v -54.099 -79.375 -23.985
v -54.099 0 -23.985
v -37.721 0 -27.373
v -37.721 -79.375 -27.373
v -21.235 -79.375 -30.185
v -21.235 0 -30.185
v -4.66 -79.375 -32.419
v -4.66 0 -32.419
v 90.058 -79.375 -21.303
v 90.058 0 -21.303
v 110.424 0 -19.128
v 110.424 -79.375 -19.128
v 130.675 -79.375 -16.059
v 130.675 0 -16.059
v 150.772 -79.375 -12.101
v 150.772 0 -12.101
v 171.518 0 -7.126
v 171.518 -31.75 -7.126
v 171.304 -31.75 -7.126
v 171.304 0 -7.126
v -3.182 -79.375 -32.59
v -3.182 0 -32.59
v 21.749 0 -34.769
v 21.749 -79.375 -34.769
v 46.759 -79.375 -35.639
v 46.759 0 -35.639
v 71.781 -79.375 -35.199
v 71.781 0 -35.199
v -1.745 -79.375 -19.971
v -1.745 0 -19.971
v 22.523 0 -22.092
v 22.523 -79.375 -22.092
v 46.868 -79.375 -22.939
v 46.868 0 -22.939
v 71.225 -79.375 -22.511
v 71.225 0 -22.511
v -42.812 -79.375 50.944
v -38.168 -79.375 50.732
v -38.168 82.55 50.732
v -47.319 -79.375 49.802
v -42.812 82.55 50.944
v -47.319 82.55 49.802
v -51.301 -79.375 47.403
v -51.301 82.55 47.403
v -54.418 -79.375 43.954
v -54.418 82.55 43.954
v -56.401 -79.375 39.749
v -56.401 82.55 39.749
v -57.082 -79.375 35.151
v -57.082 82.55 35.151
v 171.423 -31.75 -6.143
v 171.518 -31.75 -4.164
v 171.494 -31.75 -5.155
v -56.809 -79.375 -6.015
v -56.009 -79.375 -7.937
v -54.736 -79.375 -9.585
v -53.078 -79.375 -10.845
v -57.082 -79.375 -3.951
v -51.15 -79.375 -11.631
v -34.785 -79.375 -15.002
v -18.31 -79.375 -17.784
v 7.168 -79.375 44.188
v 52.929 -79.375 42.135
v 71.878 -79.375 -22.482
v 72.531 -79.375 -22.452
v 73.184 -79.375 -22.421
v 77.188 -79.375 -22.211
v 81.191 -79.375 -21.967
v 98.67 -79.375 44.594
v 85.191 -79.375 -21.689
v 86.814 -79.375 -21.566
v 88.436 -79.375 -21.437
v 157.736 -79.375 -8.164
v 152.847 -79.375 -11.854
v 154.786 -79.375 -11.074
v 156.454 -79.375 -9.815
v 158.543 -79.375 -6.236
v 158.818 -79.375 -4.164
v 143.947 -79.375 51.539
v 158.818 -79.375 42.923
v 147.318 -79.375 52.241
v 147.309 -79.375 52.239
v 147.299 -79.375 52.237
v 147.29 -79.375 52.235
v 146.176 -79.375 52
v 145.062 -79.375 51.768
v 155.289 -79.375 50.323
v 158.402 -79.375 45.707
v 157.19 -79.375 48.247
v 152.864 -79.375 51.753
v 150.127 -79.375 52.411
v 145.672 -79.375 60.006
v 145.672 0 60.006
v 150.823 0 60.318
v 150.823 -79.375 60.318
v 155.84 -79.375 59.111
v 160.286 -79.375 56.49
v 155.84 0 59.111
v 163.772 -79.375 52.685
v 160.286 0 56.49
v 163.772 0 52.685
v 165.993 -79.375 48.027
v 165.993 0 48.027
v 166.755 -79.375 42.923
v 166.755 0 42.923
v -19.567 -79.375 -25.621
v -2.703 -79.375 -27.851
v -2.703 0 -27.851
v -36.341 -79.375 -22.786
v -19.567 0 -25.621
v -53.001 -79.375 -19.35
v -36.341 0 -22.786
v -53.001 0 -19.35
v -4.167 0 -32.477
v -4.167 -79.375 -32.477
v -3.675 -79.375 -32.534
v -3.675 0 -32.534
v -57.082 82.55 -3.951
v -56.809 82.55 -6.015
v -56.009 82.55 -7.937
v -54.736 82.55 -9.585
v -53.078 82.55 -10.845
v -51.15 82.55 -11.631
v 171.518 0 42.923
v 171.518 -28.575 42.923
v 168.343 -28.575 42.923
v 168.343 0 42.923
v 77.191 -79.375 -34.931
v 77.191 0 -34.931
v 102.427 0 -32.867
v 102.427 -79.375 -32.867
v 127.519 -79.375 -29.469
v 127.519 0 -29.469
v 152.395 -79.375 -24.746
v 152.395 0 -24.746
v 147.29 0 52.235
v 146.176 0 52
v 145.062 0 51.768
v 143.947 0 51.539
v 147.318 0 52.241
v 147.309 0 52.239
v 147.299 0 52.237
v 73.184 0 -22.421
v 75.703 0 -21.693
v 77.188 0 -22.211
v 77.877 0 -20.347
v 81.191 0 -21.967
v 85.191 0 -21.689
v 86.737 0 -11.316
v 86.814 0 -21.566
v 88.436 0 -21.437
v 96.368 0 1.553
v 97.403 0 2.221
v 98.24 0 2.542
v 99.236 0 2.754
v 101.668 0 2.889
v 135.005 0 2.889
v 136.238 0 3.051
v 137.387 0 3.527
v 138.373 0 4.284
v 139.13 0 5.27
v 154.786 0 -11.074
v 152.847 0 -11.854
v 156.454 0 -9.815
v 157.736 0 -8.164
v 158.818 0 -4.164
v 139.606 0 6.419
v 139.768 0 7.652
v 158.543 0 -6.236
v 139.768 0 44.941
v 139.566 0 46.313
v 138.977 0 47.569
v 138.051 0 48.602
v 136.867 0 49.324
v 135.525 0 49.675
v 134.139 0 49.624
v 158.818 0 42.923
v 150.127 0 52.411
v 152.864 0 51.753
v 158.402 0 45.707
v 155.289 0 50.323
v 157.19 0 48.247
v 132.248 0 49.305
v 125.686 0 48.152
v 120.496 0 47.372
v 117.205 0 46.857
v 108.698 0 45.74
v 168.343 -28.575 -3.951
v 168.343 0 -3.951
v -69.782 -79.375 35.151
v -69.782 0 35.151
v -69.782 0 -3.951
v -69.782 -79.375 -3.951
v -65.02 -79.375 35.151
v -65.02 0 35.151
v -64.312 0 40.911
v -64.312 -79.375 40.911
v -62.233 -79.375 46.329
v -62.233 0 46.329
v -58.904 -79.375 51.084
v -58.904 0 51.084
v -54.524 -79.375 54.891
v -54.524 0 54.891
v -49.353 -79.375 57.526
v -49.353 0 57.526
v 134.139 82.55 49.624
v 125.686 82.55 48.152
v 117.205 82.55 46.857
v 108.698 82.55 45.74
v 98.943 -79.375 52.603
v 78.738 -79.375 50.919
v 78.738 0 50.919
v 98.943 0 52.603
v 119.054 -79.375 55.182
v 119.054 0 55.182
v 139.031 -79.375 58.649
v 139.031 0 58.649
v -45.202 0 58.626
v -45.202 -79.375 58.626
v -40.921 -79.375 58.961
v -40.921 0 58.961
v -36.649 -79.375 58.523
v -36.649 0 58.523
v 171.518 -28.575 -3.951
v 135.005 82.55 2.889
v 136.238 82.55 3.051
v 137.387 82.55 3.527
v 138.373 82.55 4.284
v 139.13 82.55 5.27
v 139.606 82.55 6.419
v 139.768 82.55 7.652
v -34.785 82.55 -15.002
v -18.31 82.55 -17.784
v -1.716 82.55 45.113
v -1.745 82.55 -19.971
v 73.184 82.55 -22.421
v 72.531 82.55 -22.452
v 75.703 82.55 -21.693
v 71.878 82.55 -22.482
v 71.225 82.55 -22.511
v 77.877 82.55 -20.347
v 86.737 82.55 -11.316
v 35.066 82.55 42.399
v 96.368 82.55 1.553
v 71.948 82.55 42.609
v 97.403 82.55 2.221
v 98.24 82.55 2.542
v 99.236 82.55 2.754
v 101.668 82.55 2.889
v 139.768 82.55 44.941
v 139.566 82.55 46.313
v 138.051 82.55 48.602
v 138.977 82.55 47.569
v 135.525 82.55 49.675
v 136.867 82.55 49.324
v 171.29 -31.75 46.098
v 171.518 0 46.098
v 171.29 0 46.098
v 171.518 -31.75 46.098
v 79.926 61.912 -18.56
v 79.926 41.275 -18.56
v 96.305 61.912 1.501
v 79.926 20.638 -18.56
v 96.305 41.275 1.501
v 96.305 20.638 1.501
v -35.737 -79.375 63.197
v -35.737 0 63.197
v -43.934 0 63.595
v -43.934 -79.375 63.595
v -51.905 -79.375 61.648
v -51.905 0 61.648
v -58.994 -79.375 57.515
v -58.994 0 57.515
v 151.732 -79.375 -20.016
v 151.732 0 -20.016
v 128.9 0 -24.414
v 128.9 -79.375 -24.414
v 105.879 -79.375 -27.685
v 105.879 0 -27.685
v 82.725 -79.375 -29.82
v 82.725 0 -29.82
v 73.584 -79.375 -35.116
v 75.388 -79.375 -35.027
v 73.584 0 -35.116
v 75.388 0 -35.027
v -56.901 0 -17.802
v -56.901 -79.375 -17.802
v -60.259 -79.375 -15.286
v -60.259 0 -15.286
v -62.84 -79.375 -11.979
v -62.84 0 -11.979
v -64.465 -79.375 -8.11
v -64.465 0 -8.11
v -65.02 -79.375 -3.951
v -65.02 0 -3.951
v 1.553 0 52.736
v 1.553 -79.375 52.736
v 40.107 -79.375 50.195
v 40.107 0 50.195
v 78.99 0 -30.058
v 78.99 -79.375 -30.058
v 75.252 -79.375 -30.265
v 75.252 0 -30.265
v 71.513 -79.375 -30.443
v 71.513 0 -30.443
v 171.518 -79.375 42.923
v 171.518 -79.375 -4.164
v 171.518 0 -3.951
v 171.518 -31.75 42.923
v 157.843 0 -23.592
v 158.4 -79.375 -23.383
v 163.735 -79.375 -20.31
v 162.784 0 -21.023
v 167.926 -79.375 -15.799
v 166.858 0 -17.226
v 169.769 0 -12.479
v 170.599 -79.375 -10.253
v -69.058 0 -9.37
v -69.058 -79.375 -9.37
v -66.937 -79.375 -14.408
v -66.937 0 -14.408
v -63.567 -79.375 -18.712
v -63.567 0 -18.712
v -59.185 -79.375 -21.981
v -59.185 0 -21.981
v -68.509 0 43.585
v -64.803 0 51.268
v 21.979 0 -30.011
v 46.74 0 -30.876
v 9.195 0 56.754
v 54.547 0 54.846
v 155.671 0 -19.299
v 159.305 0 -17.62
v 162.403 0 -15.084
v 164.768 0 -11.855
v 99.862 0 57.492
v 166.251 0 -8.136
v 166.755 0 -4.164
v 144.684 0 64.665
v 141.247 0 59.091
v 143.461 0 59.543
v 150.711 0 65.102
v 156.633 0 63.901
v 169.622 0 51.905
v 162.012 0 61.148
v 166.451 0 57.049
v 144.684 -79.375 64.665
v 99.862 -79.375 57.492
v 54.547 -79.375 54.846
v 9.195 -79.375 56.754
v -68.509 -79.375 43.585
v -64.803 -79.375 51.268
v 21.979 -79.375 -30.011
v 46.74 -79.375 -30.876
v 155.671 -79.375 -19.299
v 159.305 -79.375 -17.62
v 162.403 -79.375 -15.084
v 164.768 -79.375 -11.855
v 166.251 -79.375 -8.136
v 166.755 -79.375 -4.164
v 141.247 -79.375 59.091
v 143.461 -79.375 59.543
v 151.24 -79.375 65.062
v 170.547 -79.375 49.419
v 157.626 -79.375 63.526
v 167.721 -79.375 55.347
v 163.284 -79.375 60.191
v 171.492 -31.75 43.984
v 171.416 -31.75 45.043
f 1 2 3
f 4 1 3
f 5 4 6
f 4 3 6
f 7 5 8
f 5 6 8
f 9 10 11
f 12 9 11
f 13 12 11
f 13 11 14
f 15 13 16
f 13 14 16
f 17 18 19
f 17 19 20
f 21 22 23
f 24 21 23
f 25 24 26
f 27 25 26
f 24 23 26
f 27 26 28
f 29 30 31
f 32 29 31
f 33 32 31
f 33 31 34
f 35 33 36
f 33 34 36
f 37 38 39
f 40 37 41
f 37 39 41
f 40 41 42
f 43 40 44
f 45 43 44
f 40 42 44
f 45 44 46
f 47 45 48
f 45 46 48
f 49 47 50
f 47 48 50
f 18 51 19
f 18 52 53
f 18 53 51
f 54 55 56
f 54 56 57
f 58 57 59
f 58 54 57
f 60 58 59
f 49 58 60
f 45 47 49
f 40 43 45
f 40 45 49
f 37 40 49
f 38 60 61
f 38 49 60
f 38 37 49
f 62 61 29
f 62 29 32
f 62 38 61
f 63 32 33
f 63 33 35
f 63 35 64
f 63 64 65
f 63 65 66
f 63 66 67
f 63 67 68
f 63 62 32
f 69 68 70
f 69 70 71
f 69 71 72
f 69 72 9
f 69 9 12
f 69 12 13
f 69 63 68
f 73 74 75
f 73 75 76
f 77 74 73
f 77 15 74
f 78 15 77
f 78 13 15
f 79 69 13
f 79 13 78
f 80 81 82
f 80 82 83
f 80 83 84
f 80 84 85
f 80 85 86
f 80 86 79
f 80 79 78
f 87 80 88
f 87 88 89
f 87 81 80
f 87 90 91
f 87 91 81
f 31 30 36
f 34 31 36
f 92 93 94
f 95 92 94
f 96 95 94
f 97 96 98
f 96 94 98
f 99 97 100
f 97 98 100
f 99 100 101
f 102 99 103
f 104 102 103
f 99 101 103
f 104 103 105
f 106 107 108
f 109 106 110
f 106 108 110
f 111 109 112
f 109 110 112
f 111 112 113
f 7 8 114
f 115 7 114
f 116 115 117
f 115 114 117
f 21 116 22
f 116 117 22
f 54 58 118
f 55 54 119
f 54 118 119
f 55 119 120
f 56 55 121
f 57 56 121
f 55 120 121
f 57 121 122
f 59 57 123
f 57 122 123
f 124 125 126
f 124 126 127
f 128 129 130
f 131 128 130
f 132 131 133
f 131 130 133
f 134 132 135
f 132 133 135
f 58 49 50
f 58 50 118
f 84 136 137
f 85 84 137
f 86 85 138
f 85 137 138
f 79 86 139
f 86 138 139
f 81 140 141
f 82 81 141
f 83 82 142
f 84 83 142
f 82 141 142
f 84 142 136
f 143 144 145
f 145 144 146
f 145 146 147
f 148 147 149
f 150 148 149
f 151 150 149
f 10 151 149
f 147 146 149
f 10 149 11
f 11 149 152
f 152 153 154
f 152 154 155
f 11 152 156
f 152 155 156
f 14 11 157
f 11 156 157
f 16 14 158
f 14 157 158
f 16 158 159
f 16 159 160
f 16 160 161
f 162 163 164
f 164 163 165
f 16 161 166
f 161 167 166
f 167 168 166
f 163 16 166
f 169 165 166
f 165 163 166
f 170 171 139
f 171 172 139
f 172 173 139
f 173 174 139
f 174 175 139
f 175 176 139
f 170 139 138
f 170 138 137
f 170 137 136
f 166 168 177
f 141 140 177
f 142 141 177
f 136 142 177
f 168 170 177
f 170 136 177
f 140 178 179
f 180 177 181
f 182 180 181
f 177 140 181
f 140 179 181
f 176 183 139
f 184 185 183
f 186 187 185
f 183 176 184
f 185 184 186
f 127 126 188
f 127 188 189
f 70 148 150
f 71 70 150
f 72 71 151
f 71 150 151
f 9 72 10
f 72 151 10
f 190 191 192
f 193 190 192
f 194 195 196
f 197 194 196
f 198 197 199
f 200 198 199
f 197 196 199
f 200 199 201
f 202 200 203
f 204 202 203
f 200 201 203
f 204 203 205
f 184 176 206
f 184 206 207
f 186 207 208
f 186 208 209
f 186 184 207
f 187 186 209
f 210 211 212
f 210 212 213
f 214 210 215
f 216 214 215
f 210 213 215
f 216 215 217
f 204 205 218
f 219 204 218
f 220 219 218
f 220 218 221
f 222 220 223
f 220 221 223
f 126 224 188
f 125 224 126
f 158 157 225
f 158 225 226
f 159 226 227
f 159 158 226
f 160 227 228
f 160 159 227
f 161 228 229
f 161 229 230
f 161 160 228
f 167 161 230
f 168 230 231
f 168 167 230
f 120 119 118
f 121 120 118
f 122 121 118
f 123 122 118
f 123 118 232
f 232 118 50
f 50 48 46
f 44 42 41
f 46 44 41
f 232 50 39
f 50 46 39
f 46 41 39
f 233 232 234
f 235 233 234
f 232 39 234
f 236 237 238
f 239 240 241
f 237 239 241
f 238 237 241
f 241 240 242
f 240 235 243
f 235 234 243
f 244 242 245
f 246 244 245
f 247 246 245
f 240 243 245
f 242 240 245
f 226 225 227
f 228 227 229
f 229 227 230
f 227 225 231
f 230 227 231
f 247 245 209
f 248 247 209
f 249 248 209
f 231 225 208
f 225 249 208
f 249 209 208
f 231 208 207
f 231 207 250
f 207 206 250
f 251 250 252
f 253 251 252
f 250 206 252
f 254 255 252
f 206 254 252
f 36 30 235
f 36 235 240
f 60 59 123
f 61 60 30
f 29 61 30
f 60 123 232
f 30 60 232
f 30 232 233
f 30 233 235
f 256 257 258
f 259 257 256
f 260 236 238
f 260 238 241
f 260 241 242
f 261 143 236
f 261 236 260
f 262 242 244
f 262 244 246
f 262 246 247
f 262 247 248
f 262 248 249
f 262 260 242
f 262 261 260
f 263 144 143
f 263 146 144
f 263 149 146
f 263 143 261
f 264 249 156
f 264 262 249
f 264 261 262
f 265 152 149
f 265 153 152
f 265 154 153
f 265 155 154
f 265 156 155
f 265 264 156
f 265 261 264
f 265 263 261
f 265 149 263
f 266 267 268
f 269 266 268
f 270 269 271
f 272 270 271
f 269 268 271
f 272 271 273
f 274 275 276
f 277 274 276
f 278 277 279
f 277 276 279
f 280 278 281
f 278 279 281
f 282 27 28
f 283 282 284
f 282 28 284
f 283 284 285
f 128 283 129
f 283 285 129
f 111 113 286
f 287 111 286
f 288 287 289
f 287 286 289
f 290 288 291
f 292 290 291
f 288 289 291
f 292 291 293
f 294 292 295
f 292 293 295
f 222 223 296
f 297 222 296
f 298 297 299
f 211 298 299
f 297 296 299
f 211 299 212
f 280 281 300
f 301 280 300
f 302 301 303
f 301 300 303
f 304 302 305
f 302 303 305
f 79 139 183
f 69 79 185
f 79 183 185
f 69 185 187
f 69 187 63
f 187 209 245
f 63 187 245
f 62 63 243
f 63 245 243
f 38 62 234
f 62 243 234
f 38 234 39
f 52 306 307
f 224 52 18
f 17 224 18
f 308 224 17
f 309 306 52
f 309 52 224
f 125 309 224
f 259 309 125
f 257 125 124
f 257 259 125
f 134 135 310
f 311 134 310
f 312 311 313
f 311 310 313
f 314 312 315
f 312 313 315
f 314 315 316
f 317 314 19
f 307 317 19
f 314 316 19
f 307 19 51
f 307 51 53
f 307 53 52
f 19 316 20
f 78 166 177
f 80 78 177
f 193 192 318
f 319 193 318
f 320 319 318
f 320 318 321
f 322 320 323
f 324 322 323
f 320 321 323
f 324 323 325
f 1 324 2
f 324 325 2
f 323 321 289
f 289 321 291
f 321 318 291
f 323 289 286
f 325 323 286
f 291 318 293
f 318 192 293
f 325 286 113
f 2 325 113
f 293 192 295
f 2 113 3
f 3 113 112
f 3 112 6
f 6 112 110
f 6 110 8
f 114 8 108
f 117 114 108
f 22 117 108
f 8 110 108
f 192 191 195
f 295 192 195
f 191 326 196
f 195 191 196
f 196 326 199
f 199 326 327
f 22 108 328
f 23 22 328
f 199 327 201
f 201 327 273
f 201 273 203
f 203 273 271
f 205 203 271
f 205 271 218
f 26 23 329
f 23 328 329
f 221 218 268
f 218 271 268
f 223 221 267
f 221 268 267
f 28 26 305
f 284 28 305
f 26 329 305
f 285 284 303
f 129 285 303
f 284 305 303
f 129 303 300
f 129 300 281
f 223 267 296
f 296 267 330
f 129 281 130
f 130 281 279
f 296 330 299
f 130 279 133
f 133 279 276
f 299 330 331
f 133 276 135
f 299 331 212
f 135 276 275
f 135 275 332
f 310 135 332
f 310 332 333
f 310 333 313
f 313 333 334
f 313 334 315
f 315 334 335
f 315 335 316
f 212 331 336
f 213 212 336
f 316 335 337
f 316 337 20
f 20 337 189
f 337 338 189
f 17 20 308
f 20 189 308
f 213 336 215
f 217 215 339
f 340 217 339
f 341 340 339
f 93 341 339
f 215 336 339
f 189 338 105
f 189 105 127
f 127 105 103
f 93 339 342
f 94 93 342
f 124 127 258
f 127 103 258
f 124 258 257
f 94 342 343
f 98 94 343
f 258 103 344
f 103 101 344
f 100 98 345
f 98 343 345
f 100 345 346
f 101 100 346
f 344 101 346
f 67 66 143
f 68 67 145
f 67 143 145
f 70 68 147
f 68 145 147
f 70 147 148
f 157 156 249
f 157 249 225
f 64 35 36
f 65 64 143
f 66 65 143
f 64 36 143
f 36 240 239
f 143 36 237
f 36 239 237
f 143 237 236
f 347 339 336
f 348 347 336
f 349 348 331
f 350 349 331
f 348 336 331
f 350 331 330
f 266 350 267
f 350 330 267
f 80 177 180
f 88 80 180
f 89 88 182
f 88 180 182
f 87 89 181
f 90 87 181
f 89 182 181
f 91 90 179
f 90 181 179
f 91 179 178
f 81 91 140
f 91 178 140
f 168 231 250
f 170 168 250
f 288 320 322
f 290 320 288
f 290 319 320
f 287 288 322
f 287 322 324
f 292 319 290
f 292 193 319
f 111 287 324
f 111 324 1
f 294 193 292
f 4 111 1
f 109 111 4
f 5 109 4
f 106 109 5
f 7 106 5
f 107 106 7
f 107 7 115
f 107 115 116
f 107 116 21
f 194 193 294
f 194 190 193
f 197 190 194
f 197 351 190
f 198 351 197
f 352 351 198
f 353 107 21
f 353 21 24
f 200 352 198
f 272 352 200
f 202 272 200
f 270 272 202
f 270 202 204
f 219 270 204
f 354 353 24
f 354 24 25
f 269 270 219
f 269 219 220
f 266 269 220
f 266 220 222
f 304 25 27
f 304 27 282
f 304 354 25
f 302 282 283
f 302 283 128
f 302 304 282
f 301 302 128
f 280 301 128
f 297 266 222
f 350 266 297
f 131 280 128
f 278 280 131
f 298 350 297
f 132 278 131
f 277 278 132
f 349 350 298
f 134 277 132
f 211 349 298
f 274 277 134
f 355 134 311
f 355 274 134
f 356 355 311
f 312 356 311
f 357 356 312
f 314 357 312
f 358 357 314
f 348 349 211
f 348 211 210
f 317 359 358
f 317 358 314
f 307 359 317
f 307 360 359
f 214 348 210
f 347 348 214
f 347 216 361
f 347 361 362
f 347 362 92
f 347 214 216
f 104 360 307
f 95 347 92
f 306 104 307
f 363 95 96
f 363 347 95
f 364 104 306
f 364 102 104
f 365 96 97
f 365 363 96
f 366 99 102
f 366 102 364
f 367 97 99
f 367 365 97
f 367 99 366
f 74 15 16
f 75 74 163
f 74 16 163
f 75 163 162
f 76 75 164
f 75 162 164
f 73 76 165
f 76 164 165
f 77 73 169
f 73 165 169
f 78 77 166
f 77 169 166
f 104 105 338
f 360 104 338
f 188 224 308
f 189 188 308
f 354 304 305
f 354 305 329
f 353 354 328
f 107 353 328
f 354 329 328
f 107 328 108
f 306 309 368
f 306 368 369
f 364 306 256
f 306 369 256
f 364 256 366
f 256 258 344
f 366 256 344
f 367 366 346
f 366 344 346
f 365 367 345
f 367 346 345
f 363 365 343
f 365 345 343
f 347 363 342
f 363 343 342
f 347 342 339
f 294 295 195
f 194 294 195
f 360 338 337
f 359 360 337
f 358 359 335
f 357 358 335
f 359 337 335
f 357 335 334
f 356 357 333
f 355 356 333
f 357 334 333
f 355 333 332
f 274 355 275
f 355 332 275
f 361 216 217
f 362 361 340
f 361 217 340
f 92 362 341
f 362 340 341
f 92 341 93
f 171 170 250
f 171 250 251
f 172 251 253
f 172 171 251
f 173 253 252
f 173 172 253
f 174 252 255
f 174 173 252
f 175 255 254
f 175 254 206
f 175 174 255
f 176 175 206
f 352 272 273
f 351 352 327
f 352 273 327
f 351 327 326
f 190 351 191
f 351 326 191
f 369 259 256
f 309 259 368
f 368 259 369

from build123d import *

# Parameters (mm, degrees)
F1_DEPTH = 82.55
F2_DEPTH = 79.375
F3_DEPTH = 79.375
F4_W     = 28.575
F4_H     = 46.8736138582
F5_DEPTH = 3.175
F4_W_2   = 31.75
F4_H_2   = 2.9616859944
F6_DEPTH = 2.54


with BuildPart() as f1:
    # F0 (on Front) → F1 (new body)
    with BuildSketch(Plane.XZ):
        with BuildLine():
            ThreePointArc((-38.1684067206, 50.7320462984), (-51.3011196758, 47.4032787363), (-57.0821855985, 35.1506006681))
            Line((-57.0821855985, 35.1506006681), (-57.0821855985, -3.9509958427))
            ThreePointArc((-57.0821855985, -3.9509958427), (-55.426384653, -8.8032286523), (-51.1497980108, -11.6310629299))
            ThreePointArc((-51.1497980108, -11.6310629299), (-26.559856165, -16.4669461082), (-1.7451494661, -19.9714200409))
            Line((-1.7451494661, -19.9714200409), (71.2249001265, -22.5109117746))
            ThreePointArc((71.2249001265, -22.5109117746), (72.2045700448, -22.4669599202), (73.1841451216, -22.4209427141))
            add(Edge.make_bspline(
                [(73.1841451216, -22.4209427141), (75.9434207871, -22.0422865359), (80.6734041506, -18.2947392446), (90.8872982521, -6.9644507778), (95.7219598854, 2.2987896539), (99.1133427614, 2.8890882254), (101.6678144015, 2.8890882254)],
                knots=[0.0441067744, 0.0441067744, 0.0441067744, 0.0441067744, 0.2456007741, 0.565769449, 0.8130127393, 1, 1, 1, 1], degree=3))
            Line((101.6678144015, 2.8890882254), (135.0053144015, 2.8890882254))
            ThreePointArc((135.0053144015, 2.8890882254), (138.3729104469, 4.28399218), (139.7678144015, 7.6515882254))
            Line((139.7678144015, 7.6515882254), (139.7678144015, 44.94061737))
            ThreePointArc((139.7678144015, 44.94061737), (138.0513208027, 48.601662474), (134.1391524576, 49.6236900511))
            ThreePointArc((134.1391524576, 49.6236900511), (121.4490364743, 47.4820539253), (108.6979382545, 45.7398877005))
            ThreePointArc((108.6979382545, 45.7398877005), (35.0663733736, 42.3993804581), (-38.1684067206, 50.7320462984))
        make_face()
    extrude(amount=-F1_DEPTH)

    # F0 (on Front) → F2 (join)
    with BuildSketch(Plane.XZ):
        with BuildLine():
            ThreePointArc((147.3177307895, 52.2405936393), (147.3040014388, 52.2376837155), (147.2902720004, 52.234774206))
            ThreePointArc((147.2902720004, 52.234774206), (148.7826730727, 48.7227814214), (149.2922567745, 44.9410253836))
            Line((149.2922567745, 44.9410253836), (149.2922567745, 7.651996239))
            ThreePointArc((149.2922567745, 7.651996239), (145.1075449107, -2.4507918972), (135.0047567745, -6.635503761))
            Line((135.0047567745, -6.635503761), (102.1617779669, -6.635503761))
            ThreePointArc((102.1617779669, -6.635503761), (101.7226719352, -6.7408371438), (101.3791365615, -7.0339116663))
            add(Edge.make_bspline(
                [(90.05797947, -21.3026723511), (91.3235592577, -19.9245232349), (94.9091214249, -16.0037133084), (98.8124235031, -10.5114004565), (100.7070874629, -7.957457618), (101.3791365615, -7.0339116663)],
                knots=[0.5378357414, 0.5378357414, 0.5378357414, 0.5378357414, 0.6467666082, 0.855418257, 0.9817631457, 0.9817631457, 0.9817631457, 0.9817631457], degree=3))
            ThreePointArc((90.05797947, -21.3026723511), (120.5668523927, -17.704884738), (150.7716967973, -12.1010666461))
            ThreePointArc((150.7716967973, -12.1010666461), (156.4544400736, -9.8152415628), (158.8178144015, -4.1643098484))
            Line((158.8178144015, -4.1643098484), (158.8178144015, 42.9226180155))
            ThreePointArc((158.8178144015, 42.9226180155), (155.2891863711, 50.3232361115), (147.3177307895, 52.2405936393))
        make_face()
        with BuildLine():
            ThreePointArc((-38.1684067206, 50.7320462984), (-51.3011196758, 47.4032787363), (-57.0821855985, 35.1506006681))
            Line((-57.0821855985, 35.1506006681), (-57.0821855985, -3.9509958427))
            ThreePointArc((-57.0821855985, -3.9509958427), (-55.426384653, -8.8032286523), (-51.1497980108, -11.6310629299))
            ThreePointArc((-51.1497980108, -11.6310629299), (-26.559856165, -16.4669461082), (-1.7451494661, -19.9714200409))
            Line((-1.7451494661, -19.9714200409), (71.2249001265, -22.5109117746))
            ThreePointArc((71.2249001265, -22.5109117746), (72.2045700448, -22.4669599202), (73.1841451216, -22.4209427141))
            add(Edge.make_bspline(
                [(73.1841451216, -22.4209427141), (75.9434207871, -22.0422865359), (80.6734041506, -18.2947392446), (90.8872982521, -6.9644507778), (95.7219598854, 2.2987896539), (99.1133427614, 2.8890882254), (101.6678144015, 2.8890882254)],
                knots=[0.0441067744, 0.0441067744, 0.0441067744, 0.0441067744, 0.2456007741, 0.565769449, 0.8130127393, 1, 1, 1, 1], degree=3))
            Line((101.6678144015, 2.8890882254), (135.0053144015, 2.8890882254))
            ThreePointArc((135.0053144015, 2.8890882254), (138.3729104469, 4.28399218), (139.7678144015, 7.6515882254))
            Line((139.7678144015, 7.6515882254), (139.7678144015, 44.94061737))
            ThreePointArc((139.7678144015, 44.94061737), (138.0513208027, 48.601662474), (134.1391524576, 49.6236900511))
            ThreePointArc((134.1391524576, 49.6236900511), (121.4490364743, 47.4820539253), (108.6979382545, 45.7398877005))
            ThreePointArc((108.6979382545, 45.7398877005), (35.0663733736, 42.3993804581), (-38.1684067206, 50.7320462984))
        make_face()
        with BuildLine():
            Line((71.2249001265, -22.5109117746), (-1.7451494661, -19.9714200409))
            ThreePointArc((-1.7451494661, -19.9714200409), (34.6899692652, -22.6751725593), (71.2249001265, -22.5109117746))
        make_face()
        with BuildLine():
            ThreePointArc((143.9466783497, 51.5390768111), (126.3780011208, 48.30096912), (108.6979382545, 45.7398877005))
            ThreePointArc((108.6979382545, 45.7398877005), (121.4490364743, 47.4820539253), (134.1391524576, 49.6236900511))
            ThreePointArc((134.1391524576, 49.6236900511), (138.0513208027, 48.601662474), (139.7678144015, 44.94061737))
            Line((139.7678144015, 44.94061737), (139.7678144015, 7.6515882254))
            ThreePointArc((139.7678144015, 7.6515882254), (138.3729104469, 4.28399218), (135.0053144015, 2.8890882254))
            Line((135.0053144015, 2.8890882254), (101.6678144015, 2.8890882254))
            add(Edge.make_bspline(
                [(73.1841451216, -22.4209427141), (75.9434207871, -22.0422865359), (80.6734041506, -18.2947392446), (90.8872982521, -6.9644507778), (95.7219598854, 2.2987896539), (99.1133427614, 2.8890882254), (101.6678144015, 2.8890882254)],
                knots=[0.0441067744, 0.0441067744, 0.0441067744, 0.0441067744, 0.2456007741, 0.565769449, 0.8130127393, 1, 1, 1, 1], degree=3))
            ThreePointArc((73.1841451216, -22.4209427141), (79.189790649, -22.0935409654), (85.1907006417, -21.6885108853))
            add(Edge.make_bspline(
                [(85.1907006417, -21.6885108853), (85.3316562723, -21.546462386), (85.8592303139, -21.0108280896), (86.9005771439, -19.9219148207), (88.3189595642, -18.3981317715), (89.8468892478, -16.6679338884), (91.2112293455, -15.0269591754), (92.3641231363, -13.5963023763), (93.2389828574, -12.4562530137), (93.9140957607, -11.541767885), (94.4607060458, -10.7839701191), (94.9813999105, -10.0361040759), (95.5722075611, -9.1680828129), (96.248718327, -8.136755973), (96.9465700319, -7.0524296173), (97.6135099851, -6.0251623137), (98.2059629092, -5.1532398321), (98.689548654, -4.4904265896), (99.0533959756, -4.0628569433), (99.2758382521, -3.8343000024), (99.3994163915, -3.7241747659), (99.4644281546, -3.6700686469), (99.4988744243, -3.6524085927), (99.5407899606, -3.6191426696), (99.7042749, -3.5807788078), (100.0746003699, -3.5046651117), (100.6402444361, -3.4687488654), (101.2024357983, -3.4597335005), (101.5434034733, -3.4608528823), (101.6678144015, -3.4609117746)],
                knots=[16.4433649886, 16.4433649886, 16.4433649886, 16.4433649886, 17.0437041267, 18.6987987543, 20.9632669056, 23.2886140279, 25.6225249388, 27.3648826032, 28.8004402381, 29.933251019, 30.7748606247, 31.6034468712, 32.6670003796, 33.9247844246, 35.3035189307, 36.5355216577, 37.5988903701, 38.4660558512, 38.9951195454, 39.2820824127, 39.4215161623, 39.4921562657, 39.5348392388, 39.5367058687, 39.65261617, 40.0198626541, 40.6886532702, 41.3372818098, 41.7106892785, 41.7106892785, 41.7106892785, 41.7106892785], degree=3))
            Line((101.6678144015, -3.4609117746), (135.0053144015, -3.4609117746))
            ThreePointArc((135.0053144015, -3.4609117746), (142.8630385075, -0.2061358805), (146.1178144015, 7.6515882254))
            Line((146.1178144015, 7.6515882254), (146.1178144015, 44.94061737))
            ThreePointArc((146.1178144015, 44.94061737), (145.5610844616, 48.4138542879), (143.9466783497, 51.5390768111))
        make_face()
        with BuildLine():
            ThreePointArc((147.2902720004, 52.234774206), (145.6191136841, 51.883856768), (143.9466783497, 51.5390768111))
            ThreePointArc((143.9466783497, 51.5390768111), (145.5610844616, 48.4138542879), (146.1178144015, 44.94061737))
            Line((146.1178144015, 44.94061737), (146.1178144015, 7.6515882254))
            ThreePointArc((146.1178144015, 7.6515882254), (142.8630385075, -0.2061358805), (135.0053144015, -3.4609117746))
            Line((135.0053144015, -3.4609117746), (101.6678144015, -3.4609117746))
            add(Edge.make_bspline(
                [(85.1907006417, -21.6885108853), (85.3316562723, -21.546462386), (85.8592303139, -21.0108280896), (86.9005771439, -19.9219148207), (88.3189595642, -18.3981317715), (89.8468892478, -16.6679338884), (91.2112293455, -15.0269591754), (92.3641231363, -13.5963023763), (93.2389828574, -12.4562530137), (93.9140957607, -11.541767885), (94.4607060458, -10.7839701191), (94.9813999105, -10.0361040759), (95.5722075611, -9.1680828129), (96.248718327, -8.136755973), (96.9465700319, -7.0524296173), (97.6135099851, -6.0251623137), (98.2059629092, -5.1532398321), (98.689548654, -4.4904265896), (99.0533959756, -4.0628569433), (99.2758382521, -3.8343000024), (99.3994163915, -3.7241747659), (99.4644281546, -3.6700686469), (99.4988744243, -3.6524085927), (99.5407899606, -3.6191426696), (99.7042749, -3.5807788078), (100.0746003699, -3.5046651117), (100.6402444361, -3.4687488654), (101.2024357983, -3.4597335005), (101.5434034733, -3.4608528823), (101.6678144015, -3.4609117746)],
                knots=[16.4433649886, 16.4433649886, 16.4433649886, 16.4433649886, 17.0437041267, 18.6987987543, 20.9632669056, 23.2886140279, 25.6225249388, 27.3648826032, 28.8004402381, 29.933251019, 30.7748606247, 31.6034468712, 32.6670003796, 33.9247844246, 35.3035189307, 36.5355216577, 37.5988903701, 38.4660558512, 38.9951195454, 39.2820824127, 39.4215161623, 39.4921562657, 39.5348392388, 39.5367058687, 39.65261617, 40.0198626541, 40.6886532702, 41.3372818098, 41.7106892785, 41.7106892785, 41.7106892785, 41.7106892785], degree=3))
            ThreePointArc((85.1907006417, -21.6885108853), (87.6248463277, -21.5019781399), (90.05797947, -21.3026723511))
            add(Edge.make_bspline(
                [(90.05797947, -21.3026723511), (91.3235592577, -19.9245232349), (94.9091214249, -16.0037133084), (98.8124235031, -10.5114004565), (100.7070874629, -7.957457618), (101.3791365615, -7.0339116663)],
                knots=[0.5378357414, 0.5378357414, 0.5378357414, 0.5378357414, 0.6467666082, 0.855418257, 0.9817631457, 0.9817631457, 0.9817631457, 0.9817631457], degree=3))
            ThreePointArc((101.3791365615, -7.0339116663), (101.7226719352, -6.7408371438), (102.1617779669, -6.635503761))
            Line((102.1617779669, -6.635503761), (135.0047567745, -6.635503761))
            ThreePointArc((135.0047567745, -6.635503761), (145.1075449107, -2.4507918972), (149.2922567745, 7.651996239))
            Line((149.2922567745, 7.651996239), (149.2922567745, 44.9410253836))
            ThreePointArc((149.2922567745, 44.9410253836), (148.7826730727, 48.7227814214), (147.2902720004, 52.234774206))
        make_face()
    extrude(amount=F2_DEPTH)


with BuildPart() as f3:
    # F0 (on Front) → F3 (new body, through all)
    with BuildSketch(Plane.XZ):
        with BuildLine():
            ThreePointArc((132.4062709427, 58.990243427), (135.738879221, 59.2096525244), (139.0313728552, 58.6493812))
            ThreePointArc((139.0313728552, 58.6493812), (142.3541133744, 59.3151723379), (145.6718277794, 60.0055733258))
            ThreePointArc((145.6718277794, 60.0055733258), (160.2861630124, 56.4904178581), (166.7553144015, 42.9226180155))
            Line((166.7553144015, 42.9226180155), (166.7553144015, -4.1643098484))
            ThreePointArc((166.7553144015, -4.1643098484), (162.4027739248, -15.0844083614), (151.7318748381, -20.0164538618))
            ThreePointArc((151.7318748381, -20.0164538618), (117.4094171072, -26.1909263021), (82.7253645007, -29.8202112722))
            add(Edge.make_bspline(
                [(77.1908889413, -34.9310041013), (79.0586963991, -34.1575165718), (80.8680638127, -32.1097305181), (82.7253645007, -29.8202112722)],
                knots=[0.162211173, 0.162211173, 0.162211173, 0.162211173, 0.327643252, 0.327643252, 0.327643252, 0.327643252], degree=3))
            ThreePointArc((77.1908889413, -34.9310041013), (114.9955885429, -31.3339380944), (152.3952542371, -24.7461310395))
            ThreePointArc((152.3952542371, -24.7461310395), (165.9993583049, -18.2114062635), (171.5178144015, -4.1643098484))
            Line((171.5178144015, -4.1643098484), (171.5178144015, 42.9226180155))
            ThreePointArc((171.5178144015, 42.9226180155), (163.2843489972, 60.1907269061), (144.6842859734, 64.6645611377))
            ThreePointArc((144.6842859734, 64.6645611377), (54.5473390558, 54.8458656938), (-35.7373836183, 63.1972028027))
            ThreePointArc((-35.7373836183, 63.1972028027), (-47.9894824097, 62.9090421763), (-58.9940096578, 57.5148470198))
            ThreePointArc((-58.9940096578, 57.5148470198), (-54.1741296377, 57.9822564385), (-49.3531385655, 57.5264494008))
            ThreePointArc((-49.3531385655, 57.5264494008), (-43.0689624156, 58.8902077274), (-36.6490172816, 58.5227691136))
            ThreePointArc((-36.6490172816, 58.5227691136), (20.8030241166, 51.0579820963), (78.7378210089, 50.9186440567))
            ThreePointArc((78.7378210089, 50.9186440567), (105.6923376876, 54.1546184016), (132.4062709427, 58.990243427))
        make_face()
        with BuildLine():
            ThreePointArc((78.7378210089, 50.9186440567), (109.0132194598, 53.780860031), (139.0313728552, 58.6493812))
            ThreePointArc((139.0313728552, 58.6493812), (135.738879221, 59.2096525244), (132.4062709427, 58.990243427))
            ThreePointArc((132.4062709427, 58.990243427), (105.6923376876, 54.1546184016), (78.7378210089, 50.9186440567))
        make_face()
        with BuildLine():
            add(Edge.make_bspline(
                [(77.1908889413, -34.9310041013), (79.0586963991, -34.1575165718), (80.8680638127, -32.1097305181), (82.7253645007, -29.8202112722)],
                knots=[0.162211173, 0.162211173, 0.162211173, 0.162211173, 0.327643252, 0.327643252, 0.327643252, 0.327643252], degree=3))
            ThreePointArc((82.7253645007, -29.8202112722), (77.1209443112, -30.1650809379), (71.5128256368, -30.4434075081))
            ThreePointArc((71.5128256368, -30.4434075081), (34.3539466955, -30.605779919), (-2.703044418, -27.8511368217))
            ThreePointArc((-2.703044418, -27.8511368217), (-27.9667532328, -24.2792414083), (-53.0011395648, -19.3504564763))
            ThreePointArc((-53.0011395648, -19.3504564763), (-61.6594135563, -13.7181453318), (-65.0196855985, -3.9509958427))
            Line((-65.0196855985, -3.9509958427), (-65.0196855985, 35.1506006681))
            ThreePointArc((-65.0196855985, 35.1506006681), (-60.7137314393, 48.8081929014), (-49.3531385655, 57.5264494008))
            ThreePointArc((-49.3531385655, 57.5264494008), (-54.1741296377, 57.9822564385), (-58.9940096578, 57.5148470198))
            ThreePointArc((-58.9940096578, 57.5148470198), (-66.9442126461, 47.5657552685), (-69.7821855985, 35.1506006681))
            Line((-69.7821855985, 35.1506006681), (-69.7821855985, -3.9509958427))
            ThreePointArc((-69.7821855985, -3.9509958427), (-65.3951121534, -16.6722396119), (-54.0990802773, -23.9849764661))
            ThreePointArc((-54.0990802773, -23.9849764661), (-29.4903018523, -28.8512076957), (-4.6600570397, -32.4192778318))
            ThreePointArc((-4.6600570397, -32.4192778318), (-3.9209354004, -32.5051712085), (-3.1816809027, -32.5899135101))
            ThreePointArc((-3.1816809027, -32.5899135101), (34.2482533571, -35.3674886228), (71.7807249927, -35.198742902))
            ThreePointArc((71.7807249927, -35.198742902), (74.4861863572, -35.0725397923), (77.1908889413, -34.9310041013))
        make_face()
    extrude(amount=F3_DEPTH)

    # F4 (on face) → F5 (cut)
    with BuildSketch(Plane.YZ.offset(171.5178144015)):
        with Locations((-14.2875, 19.4858110864)):
            Rectangle(F4_W, F4_H)
    extrude(amount=-F5_DEPTH, mode=Mode.SUBTRACT)

    # F4 (on face) → F6 (join)
    with BuildSketch(Plane.YZ.offset(171.5178144015)):
        Polygon((-28.575, 42.9226180155), (0, 42.9226180155), (0, 46.0976180155), (-31.75, 46.0976180155), (-31.75, 42.9226180155), align=None)
        Polygon((-28.575, -3.9509958427), (-28.575, 42.9226180155), (-31.75, 42.9226180155), (-31.75, -4.1643098484), (0, -4.1643098484), (0, -3.9509958427), align=None)
        with Locations((-15.875, -5.6451528456)):
            Rectangle(F4_W_2, F4_H_2)
    extrude(amount=-F6_DEPTH)


solid = Compound([f1.part, f3.part])
